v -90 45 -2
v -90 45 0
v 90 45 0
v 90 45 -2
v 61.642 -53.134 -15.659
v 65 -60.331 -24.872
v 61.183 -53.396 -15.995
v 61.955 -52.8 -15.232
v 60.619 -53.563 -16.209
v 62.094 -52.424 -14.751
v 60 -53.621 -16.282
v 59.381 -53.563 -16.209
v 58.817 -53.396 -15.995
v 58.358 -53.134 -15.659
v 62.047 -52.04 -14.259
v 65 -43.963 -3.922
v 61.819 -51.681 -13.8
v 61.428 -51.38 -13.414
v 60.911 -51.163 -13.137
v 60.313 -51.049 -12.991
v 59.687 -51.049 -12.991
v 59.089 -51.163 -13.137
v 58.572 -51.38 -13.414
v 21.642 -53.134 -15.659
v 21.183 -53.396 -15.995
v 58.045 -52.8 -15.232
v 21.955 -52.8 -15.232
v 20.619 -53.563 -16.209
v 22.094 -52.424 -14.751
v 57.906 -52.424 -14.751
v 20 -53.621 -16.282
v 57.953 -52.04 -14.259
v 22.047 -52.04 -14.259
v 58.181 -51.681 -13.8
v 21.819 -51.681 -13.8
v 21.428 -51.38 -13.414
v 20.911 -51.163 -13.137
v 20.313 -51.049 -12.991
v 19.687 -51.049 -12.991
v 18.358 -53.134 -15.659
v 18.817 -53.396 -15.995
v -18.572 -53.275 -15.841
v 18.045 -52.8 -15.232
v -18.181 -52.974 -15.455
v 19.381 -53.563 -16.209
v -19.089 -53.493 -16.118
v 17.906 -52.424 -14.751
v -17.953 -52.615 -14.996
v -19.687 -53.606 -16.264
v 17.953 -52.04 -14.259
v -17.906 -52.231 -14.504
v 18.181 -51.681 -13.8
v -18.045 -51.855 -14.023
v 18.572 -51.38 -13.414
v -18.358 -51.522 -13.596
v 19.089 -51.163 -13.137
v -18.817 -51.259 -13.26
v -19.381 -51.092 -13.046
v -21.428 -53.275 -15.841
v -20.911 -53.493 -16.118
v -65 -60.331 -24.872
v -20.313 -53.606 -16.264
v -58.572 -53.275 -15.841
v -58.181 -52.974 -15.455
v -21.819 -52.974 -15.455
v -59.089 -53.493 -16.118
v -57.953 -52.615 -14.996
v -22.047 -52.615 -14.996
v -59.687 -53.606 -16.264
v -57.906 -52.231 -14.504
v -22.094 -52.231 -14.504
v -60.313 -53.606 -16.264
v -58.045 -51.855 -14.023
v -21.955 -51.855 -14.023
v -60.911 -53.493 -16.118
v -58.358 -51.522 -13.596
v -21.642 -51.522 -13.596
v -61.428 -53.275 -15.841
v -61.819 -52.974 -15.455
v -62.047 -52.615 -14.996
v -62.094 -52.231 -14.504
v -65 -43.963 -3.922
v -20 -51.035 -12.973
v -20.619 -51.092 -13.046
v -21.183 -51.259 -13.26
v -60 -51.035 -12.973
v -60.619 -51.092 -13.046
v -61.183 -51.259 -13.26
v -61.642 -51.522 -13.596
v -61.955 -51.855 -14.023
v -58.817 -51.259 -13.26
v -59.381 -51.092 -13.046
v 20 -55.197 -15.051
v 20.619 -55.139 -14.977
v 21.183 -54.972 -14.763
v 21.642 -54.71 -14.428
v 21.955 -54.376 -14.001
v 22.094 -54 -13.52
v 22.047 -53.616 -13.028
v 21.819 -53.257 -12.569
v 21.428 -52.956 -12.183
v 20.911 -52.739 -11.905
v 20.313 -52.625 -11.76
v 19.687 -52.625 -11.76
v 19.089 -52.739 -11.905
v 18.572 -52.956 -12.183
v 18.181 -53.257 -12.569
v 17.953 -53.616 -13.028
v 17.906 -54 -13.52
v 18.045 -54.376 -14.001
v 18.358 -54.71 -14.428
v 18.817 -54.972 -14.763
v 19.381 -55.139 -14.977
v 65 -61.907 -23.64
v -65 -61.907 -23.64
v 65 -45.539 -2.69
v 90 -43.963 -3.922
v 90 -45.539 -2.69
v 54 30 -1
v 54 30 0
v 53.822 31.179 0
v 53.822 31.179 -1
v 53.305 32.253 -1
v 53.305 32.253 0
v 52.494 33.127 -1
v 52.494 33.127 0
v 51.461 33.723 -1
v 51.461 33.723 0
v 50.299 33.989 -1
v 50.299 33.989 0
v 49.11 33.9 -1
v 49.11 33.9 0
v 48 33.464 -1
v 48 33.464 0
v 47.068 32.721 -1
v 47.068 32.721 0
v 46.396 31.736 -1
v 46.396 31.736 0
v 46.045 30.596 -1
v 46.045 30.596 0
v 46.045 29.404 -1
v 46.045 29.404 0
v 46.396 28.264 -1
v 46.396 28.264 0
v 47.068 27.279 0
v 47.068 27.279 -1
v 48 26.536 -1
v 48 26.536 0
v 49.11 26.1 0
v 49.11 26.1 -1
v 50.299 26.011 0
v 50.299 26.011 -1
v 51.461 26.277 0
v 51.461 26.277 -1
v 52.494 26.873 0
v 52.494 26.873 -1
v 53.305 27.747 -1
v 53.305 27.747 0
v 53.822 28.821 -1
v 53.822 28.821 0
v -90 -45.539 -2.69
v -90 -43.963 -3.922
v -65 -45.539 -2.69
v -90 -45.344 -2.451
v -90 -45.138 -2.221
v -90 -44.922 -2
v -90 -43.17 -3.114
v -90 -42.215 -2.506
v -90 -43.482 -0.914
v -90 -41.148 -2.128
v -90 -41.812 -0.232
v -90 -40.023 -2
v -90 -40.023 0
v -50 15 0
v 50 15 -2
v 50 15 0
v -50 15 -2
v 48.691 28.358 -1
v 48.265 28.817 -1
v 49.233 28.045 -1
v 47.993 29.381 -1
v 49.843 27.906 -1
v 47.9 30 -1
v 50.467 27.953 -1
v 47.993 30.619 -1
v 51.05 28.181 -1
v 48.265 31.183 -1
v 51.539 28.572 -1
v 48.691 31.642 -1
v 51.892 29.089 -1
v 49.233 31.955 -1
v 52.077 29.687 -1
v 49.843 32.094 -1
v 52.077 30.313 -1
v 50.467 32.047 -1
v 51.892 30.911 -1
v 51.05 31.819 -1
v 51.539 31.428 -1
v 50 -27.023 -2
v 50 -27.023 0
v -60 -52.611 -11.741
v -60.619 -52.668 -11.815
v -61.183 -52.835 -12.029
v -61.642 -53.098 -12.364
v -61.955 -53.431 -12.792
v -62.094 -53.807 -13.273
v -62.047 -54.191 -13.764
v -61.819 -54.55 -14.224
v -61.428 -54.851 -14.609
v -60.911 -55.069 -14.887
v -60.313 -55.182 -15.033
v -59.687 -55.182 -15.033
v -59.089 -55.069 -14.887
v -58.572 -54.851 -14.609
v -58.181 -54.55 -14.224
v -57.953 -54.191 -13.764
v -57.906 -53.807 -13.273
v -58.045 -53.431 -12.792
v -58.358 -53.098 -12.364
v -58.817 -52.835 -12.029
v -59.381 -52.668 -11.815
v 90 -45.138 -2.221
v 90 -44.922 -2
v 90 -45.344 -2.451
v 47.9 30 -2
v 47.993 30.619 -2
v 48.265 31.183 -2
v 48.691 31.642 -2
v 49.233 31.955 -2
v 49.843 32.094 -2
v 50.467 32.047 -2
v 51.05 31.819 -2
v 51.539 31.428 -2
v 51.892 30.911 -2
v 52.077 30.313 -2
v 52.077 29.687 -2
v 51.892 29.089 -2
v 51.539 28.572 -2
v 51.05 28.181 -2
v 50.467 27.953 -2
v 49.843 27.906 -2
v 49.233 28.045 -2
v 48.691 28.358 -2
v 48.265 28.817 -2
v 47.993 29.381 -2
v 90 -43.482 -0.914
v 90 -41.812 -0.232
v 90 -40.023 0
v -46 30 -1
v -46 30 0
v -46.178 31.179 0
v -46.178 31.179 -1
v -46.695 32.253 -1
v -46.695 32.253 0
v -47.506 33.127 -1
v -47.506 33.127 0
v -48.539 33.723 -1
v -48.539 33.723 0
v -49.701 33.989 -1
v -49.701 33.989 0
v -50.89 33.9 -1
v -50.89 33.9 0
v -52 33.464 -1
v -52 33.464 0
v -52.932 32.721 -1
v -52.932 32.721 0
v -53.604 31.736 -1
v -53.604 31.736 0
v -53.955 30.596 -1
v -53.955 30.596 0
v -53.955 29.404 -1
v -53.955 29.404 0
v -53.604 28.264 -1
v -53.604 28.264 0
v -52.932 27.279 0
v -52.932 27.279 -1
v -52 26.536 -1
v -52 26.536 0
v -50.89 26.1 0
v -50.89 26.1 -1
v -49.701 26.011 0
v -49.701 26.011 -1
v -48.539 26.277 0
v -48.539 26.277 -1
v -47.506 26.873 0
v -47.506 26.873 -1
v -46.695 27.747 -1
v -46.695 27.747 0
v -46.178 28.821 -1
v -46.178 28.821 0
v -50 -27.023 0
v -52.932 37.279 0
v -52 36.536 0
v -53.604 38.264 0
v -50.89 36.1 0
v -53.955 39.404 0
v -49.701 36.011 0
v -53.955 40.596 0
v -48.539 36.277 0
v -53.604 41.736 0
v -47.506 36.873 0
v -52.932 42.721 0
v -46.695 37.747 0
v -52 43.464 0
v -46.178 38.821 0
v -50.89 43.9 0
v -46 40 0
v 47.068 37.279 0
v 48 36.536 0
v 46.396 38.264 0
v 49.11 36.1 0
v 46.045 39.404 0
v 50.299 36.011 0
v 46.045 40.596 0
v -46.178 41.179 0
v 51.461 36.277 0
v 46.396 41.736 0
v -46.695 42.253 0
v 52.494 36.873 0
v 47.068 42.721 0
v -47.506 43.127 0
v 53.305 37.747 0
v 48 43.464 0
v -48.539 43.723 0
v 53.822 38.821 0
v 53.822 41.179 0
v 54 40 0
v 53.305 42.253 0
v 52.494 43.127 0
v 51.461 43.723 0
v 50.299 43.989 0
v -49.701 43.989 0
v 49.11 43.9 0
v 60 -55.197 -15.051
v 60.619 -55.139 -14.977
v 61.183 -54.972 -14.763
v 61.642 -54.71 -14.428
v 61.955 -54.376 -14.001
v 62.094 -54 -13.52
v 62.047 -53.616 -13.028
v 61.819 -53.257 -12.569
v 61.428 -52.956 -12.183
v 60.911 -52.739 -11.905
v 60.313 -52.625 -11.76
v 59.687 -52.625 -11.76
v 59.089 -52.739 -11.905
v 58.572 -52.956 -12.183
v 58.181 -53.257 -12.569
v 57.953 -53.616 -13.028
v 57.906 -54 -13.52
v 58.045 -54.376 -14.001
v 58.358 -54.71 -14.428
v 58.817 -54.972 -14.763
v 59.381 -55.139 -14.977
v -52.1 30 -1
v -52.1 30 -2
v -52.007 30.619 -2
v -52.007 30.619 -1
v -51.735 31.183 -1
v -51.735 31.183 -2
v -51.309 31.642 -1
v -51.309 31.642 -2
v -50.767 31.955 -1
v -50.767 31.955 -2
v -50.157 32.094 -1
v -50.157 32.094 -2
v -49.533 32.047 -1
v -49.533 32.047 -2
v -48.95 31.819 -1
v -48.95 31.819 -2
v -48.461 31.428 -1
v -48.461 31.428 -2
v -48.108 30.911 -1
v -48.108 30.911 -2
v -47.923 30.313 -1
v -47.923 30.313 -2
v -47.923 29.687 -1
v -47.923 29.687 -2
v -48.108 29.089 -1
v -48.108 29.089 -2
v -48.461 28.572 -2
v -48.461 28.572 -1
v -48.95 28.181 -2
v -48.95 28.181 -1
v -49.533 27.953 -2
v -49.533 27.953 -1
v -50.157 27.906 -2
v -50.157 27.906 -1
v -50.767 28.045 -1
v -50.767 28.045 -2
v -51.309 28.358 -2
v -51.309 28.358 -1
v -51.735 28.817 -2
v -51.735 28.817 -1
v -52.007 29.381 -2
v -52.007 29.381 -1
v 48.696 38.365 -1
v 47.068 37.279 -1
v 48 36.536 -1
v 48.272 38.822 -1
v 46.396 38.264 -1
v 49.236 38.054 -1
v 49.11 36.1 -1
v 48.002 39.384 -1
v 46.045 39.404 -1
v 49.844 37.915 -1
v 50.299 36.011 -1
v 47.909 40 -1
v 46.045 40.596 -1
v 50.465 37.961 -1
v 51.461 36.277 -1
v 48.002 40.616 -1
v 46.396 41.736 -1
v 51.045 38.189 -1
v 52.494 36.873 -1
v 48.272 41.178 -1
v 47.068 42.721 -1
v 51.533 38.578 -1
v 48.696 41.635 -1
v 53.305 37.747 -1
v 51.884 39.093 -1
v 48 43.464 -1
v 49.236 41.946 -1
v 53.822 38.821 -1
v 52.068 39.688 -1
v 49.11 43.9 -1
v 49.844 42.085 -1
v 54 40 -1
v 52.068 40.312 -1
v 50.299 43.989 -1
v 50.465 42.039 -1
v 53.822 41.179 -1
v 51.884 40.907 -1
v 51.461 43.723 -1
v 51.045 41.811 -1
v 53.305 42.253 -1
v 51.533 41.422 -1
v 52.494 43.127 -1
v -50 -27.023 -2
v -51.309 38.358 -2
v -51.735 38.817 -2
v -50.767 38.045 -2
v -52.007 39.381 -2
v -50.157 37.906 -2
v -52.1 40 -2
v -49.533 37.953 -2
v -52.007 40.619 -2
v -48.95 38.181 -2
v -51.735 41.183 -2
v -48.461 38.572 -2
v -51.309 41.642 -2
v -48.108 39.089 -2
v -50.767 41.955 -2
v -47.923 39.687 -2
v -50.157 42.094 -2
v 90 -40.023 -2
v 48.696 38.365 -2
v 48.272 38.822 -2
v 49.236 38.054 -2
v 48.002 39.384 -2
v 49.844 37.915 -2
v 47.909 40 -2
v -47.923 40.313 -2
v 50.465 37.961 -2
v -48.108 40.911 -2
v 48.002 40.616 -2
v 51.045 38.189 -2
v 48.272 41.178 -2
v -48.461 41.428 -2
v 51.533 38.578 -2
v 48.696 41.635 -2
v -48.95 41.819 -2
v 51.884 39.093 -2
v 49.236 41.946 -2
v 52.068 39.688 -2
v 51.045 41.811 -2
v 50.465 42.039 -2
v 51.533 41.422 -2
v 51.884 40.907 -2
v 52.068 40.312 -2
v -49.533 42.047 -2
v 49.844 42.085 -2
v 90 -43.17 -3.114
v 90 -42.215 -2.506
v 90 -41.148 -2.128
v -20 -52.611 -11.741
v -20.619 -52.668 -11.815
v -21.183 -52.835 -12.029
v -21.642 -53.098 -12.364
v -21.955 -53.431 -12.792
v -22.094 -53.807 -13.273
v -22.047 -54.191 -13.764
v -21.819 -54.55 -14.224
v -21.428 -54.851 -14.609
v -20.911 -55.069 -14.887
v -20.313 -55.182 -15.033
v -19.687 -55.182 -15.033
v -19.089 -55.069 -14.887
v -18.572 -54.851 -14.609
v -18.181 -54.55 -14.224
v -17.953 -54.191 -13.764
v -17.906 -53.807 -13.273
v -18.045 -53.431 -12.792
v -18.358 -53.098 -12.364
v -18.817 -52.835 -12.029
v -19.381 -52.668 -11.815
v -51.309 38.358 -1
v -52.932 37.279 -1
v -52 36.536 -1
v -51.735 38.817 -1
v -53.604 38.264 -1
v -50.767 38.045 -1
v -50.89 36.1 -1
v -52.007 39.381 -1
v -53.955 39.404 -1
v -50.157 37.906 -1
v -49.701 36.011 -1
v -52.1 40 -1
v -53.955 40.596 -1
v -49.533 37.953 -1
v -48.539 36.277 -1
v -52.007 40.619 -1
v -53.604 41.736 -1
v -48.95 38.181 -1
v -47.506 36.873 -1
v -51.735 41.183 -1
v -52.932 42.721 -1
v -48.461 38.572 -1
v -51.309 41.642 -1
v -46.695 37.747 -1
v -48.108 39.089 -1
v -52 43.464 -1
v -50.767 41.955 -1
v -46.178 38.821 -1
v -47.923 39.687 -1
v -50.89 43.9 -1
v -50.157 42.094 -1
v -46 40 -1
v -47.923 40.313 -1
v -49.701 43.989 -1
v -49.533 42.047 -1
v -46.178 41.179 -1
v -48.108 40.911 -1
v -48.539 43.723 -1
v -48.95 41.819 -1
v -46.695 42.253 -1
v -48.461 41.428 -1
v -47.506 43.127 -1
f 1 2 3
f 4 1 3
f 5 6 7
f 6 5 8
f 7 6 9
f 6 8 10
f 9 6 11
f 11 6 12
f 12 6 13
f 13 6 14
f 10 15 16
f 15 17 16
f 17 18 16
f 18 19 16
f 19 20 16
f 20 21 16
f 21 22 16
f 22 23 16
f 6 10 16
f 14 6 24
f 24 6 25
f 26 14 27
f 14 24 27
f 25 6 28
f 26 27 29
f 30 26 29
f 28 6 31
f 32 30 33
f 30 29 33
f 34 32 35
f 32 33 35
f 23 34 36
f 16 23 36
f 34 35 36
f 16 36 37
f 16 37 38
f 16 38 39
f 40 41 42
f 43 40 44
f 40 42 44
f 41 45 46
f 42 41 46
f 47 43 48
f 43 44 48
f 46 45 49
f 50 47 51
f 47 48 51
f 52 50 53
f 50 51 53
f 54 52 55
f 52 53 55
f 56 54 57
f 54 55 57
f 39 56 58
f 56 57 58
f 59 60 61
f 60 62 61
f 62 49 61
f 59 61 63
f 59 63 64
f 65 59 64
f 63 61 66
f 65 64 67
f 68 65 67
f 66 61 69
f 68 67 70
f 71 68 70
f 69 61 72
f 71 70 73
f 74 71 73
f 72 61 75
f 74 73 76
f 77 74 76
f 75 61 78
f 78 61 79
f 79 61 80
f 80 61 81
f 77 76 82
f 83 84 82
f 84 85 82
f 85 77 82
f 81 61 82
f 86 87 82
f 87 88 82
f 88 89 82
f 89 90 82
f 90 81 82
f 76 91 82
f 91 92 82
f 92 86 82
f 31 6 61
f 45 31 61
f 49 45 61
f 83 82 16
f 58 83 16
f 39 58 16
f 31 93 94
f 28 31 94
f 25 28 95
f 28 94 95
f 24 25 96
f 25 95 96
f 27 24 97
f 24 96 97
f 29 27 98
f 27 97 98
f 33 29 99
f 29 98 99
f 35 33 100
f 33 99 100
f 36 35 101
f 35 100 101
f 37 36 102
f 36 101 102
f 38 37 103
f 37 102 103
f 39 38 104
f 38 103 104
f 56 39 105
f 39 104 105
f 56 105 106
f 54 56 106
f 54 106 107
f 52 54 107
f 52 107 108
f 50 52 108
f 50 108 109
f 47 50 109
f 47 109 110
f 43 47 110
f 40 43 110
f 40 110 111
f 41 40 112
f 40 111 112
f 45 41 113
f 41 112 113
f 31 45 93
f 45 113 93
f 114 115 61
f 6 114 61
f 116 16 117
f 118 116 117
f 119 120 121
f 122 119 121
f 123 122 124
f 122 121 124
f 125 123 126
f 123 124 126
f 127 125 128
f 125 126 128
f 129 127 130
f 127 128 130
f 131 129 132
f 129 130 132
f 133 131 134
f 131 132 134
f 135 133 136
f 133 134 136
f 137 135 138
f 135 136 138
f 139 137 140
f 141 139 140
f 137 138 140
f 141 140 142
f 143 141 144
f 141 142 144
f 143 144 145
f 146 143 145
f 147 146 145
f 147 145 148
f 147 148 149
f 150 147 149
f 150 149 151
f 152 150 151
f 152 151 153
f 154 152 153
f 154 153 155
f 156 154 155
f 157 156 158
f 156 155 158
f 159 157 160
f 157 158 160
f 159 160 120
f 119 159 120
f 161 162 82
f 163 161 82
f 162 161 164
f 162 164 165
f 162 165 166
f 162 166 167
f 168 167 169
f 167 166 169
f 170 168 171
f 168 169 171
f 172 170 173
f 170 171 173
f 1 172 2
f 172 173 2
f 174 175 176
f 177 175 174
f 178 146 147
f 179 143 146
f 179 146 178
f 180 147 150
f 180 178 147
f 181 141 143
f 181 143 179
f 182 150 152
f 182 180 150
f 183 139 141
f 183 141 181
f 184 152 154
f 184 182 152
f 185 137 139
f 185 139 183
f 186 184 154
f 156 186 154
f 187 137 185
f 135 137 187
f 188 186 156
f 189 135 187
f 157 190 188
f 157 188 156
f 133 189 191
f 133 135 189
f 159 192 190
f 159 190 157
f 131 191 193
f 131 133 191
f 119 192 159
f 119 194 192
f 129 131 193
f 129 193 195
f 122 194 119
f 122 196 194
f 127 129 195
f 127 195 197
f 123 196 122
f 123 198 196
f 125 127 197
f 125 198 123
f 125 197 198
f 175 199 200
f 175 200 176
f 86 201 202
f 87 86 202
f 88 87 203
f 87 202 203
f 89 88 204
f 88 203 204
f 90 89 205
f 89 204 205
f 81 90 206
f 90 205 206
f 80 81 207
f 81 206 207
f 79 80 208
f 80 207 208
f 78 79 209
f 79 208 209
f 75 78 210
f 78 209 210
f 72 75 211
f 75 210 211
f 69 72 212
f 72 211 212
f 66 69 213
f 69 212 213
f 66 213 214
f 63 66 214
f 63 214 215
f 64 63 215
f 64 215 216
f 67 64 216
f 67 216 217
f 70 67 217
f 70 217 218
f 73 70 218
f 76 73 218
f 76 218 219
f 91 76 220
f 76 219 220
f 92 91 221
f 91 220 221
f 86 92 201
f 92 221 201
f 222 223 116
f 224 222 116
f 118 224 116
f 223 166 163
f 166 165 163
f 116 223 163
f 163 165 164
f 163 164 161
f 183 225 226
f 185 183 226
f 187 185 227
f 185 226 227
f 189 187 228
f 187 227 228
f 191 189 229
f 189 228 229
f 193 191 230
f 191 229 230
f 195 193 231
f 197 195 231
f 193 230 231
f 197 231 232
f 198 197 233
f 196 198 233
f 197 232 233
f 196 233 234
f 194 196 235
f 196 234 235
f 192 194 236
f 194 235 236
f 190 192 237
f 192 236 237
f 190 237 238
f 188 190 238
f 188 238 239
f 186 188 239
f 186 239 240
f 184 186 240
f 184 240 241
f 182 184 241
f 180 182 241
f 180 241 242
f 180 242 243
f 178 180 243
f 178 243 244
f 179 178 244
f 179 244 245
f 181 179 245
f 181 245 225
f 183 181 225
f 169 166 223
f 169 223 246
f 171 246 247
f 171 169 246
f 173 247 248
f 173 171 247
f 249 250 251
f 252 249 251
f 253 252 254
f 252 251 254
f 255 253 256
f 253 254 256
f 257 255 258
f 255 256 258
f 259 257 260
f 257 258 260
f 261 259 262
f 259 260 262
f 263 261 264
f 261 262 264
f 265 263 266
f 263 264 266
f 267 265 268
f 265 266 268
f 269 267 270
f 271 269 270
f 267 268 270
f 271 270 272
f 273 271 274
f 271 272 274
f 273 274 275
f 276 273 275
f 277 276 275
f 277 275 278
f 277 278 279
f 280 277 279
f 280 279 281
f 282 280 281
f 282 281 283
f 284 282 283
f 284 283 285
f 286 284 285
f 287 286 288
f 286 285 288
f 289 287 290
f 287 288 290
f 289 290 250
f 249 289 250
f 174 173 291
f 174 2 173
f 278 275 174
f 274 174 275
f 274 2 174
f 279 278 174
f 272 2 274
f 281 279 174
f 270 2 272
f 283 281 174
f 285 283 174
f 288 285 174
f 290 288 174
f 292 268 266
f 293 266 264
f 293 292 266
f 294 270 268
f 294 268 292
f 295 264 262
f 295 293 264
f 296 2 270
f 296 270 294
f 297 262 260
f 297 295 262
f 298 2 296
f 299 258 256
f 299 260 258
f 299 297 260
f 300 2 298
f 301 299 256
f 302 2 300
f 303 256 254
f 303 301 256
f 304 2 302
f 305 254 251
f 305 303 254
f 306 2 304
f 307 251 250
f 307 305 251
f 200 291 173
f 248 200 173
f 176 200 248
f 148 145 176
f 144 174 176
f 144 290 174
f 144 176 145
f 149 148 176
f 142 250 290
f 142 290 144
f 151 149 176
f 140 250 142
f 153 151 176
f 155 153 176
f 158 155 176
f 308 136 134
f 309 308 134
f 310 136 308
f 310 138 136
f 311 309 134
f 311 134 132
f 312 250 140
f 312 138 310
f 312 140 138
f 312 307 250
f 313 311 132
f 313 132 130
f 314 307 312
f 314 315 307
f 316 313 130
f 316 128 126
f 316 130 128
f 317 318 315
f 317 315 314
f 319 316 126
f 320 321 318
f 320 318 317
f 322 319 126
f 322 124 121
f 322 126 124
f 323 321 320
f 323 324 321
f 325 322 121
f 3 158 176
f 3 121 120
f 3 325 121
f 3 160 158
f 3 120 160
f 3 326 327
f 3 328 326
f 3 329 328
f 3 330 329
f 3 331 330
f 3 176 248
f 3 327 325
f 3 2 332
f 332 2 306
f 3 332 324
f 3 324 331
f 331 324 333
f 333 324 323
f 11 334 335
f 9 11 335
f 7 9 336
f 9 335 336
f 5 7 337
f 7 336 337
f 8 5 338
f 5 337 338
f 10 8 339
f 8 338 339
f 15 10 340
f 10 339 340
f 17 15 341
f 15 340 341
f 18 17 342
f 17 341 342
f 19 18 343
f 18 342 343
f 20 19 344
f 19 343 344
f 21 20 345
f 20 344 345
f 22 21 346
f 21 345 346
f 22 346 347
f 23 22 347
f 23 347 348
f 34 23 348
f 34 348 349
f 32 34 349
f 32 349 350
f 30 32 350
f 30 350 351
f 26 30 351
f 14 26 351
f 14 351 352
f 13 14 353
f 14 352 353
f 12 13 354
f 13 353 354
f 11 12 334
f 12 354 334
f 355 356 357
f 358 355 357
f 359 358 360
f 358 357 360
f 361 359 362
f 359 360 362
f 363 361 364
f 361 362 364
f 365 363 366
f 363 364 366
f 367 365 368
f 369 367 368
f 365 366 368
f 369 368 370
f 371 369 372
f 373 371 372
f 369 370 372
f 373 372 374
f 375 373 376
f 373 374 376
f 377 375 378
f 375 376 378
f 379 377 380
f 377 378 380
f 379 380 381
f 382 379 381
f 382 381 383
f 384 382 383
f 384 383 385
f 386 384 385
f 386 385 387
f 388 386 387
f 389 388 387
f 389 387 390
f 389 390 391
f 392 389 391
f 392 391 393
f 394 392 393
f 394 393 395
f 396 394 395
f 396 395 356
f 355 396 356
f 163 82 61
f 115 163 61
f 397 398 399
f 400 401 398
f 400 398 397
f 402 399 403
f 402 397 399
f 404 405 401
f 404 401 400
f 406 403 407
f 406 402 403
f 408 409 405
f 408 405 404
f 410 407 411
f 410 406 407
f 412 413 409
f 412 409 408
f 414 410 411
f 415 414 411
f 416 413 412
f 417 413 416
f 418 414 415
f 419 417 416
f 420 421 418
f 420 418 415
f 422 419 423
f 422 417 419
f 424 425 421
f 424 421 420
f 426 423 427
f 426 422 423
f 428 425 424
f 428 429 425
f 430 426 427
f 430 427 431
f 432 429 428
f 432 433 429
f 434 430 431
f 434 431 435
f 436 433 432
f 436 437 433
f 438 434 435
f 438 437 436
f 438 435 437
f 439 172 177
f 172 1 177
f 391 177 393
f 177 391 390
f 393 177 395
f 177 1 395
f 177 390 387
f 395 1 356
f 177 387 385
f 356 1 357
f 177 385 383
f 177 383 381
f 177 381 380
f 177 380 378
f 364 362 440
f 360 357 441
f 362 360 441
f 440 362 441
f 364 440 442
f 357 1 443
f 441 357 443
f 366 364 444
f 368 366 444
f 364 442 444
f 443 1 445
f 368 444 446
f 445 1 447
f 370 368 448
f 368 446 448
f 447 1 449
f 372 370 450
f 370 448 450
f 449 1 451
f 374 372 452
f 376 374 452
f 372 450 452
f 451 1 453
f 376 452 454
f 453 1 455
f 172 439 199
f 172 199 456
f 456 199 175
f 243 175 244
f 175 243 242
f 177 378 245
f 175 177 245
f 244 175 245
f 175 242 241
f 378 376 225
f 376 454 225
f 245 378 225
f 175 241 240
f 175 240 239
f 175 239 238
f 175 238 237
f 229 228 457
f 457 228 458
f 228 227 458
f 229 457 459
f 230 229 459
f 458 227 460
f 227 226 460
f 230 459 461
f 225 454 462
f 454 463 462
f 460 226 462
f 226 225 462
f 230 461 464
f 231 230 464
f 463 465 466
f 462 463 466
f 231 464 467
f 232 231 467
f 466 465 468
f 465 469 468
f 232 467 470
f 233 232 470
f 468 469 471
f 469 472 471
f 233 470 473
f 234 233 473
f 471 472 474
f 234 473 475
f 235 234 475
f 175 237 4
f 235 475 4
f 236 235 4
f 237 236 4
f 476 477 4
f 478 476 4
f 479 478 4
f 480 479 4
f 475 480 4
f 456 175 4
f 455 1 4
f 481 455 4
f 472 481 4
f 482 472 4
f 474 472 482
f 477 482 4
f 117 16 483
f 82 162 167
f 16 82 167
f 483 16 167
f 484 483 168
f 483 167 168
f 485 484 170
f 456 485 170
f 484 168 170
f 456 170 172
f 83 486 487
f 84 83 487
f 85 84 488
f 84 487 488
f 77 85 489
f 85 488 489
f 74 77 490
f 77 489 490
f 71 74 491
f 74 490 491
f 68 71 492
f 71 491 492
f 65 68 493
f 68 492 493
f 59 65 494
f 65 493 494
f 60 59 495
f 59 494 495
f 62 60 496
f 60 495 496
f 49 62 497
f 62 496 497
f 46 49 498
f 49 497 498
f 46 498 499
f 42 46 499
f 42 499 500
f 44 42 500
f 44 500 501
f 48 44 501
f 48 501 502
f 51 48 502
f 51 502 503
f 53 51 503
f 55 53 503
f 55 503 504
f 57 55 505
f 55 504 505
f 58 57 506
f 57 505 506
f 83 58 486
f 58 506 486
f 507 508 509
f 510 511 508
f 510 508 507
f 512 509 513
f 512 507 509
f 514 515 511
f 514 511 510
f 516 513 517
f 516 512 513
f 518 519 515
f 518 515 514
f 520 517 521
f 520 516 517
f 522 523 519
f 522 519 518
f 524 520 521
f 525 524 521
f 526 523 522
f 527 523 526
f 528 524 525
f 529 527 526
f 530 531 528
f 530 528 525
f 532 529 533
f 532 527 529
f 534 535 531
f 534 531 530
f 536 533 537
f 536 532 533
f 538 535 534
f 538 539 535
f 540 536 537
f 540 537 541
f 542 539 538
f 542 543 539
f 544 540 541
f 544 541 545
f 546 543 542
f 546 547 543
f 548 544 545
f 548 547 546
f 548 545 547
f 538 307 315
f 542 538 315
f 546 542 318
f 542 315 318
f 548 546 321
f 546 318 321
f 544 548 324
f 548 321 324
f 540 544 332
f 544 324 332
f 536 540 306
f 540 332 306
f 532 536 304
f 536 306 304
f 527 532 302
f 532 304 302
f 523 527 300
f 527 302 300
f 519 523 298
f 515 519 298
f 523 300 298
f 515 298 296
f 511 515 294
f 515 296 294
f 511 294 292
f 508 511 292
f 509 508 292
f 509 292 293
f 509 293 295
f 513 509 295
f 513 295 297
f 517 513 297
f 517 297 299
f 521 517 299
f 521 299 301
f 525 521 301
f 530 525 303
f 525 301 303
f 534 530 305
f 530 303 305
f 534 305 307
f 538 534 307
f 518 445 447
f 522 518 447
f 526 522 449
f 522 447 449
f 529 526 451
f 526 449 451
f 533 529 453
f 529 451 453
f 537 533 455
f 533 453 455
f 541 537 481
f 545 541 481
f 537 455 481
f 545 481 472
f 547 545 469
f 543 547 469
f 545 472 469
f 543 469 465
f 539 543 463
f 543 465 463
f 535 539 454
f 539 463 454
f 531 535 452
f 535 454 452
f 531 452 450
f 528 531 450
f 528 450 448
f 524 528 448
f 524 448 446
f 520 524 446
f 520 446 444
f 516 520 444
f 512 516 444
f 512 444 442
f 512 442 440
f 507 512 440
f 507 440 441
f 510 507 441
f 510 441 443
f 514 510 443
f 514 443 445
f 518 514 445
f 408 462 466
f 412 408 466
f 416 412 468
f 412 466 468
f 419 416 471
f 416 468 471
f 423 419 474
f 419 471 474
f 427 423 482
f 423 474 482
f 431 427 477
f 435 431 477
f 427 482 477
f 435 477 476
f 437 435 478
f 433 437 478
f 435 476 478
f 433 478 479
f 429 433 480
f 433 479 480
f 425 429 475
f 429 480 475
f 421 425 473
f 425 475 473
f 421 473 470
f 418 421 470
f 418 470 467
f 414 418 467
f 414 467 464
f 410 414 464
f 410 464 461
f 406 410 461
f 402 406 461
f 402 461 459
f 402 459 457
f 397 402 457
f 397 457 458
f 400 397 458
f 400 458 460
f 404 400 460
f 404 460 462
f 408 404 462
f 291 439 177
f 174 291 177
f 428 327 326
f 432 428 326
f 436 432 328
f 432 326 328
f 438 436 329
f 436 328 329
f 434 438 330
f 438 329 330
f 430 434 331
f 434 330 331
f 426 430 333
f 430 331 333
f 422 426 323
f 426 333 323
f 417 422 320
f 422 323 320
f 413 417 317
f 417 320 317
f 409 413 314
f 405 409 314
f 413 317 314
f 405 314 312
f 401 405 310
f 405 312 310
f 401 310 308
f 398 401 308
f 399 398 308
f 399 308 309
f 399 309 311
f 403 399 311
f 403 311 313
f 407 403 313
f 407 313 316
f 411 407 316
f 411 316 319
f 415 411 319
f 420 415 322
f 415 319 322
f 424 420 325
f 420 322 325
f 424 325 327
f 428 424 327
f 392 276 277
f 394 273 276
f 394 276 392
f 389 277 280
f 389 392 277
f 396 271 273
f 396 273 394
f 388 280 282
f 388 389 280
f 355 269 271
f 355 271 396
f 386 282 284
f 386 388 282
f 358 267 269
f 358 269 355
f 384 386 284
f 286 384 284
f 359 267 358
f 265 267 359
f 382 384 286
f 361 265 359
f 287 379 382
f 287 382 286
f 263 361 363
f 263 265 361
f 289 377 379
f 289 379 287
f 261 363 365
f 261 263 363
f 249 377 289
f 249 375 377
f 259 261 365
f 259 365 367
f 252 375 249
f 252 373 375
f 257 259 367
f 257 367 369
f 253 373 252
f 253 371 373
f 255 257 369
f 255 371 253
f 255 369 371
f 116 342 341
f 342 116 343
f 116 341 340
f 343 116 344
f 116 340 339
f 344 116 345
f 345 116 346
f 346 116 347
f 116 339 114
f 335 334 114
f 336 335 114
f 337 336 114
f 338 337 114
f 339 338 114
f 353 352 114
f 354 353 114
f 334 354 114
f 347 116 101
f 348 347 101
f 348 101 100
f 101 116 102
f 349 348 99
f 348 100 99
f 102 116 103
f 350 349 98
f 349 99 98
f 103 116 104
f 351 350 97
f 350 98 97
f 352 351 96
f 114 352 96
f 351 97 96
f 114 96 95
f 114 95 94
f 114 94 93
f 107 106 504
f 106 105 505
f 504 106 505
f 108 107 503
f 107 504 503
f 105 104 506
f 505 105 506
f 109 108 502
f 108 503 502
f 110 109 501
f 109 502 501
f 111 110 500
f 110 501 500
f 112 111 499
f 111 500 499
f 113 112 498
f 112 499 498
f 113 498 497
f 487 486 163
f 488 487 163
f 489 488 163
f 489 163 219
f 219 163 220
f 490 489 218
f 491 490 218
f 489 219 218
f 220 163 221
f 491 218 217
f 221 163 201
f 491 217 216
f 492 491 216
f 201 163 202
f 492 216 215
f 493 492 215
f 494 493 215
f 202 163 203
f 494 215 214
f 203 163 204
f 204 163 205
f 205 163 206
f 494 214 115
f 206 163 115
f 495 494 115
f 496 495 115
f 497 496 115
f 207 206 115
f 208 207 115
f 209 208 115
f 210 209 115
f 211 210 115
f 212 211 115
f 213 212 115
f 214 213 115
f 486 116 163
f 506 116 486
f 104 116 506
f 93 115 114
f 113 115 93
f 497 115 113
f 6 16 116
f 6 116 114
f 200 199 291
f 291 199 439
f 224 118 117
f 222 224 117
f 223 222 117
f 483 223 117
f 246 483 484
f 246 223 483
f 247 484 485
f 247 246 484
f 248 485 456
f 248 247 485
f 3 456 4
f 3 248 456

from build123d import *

# Parameters (mm, degrees)
SKETCH_2_W               = 180
SKETCH_2_H               = 90
SM_BASE_FLANGE_1_DEPTH   = 2
SM_START                 = -90
SM_EDGE_FLANGE_1_DEPTH   = 180
SM_EDGE_FLANGE_1_2_DEPTH = 180
SKETCH_10_W              = 100
SKETCH_10_H              = 42.023300627
CUT_EXTRUDE_1_DEPTH      = 10
SKETCH_11_R              = 2.1
CUT_EXTRUDE_2_DEPTH      = 2
SKETCH_12_W              = 25
SKETCH_12_H              = 26.58587188
CUT_EXTRUDE_3_DEPTH      = 10
SKETCH_13_R              = 2.1
SKETCH_13_R_2            = 2.090991101
CUT_EXTRUDE_4_DEPTH      = 10
SKETCH_14_R              = 4
CUT_EXTRUDE_5_DEPTH      = 1


# Read off the part's stored shape, not the designer's step: 边线-法兰1
# Sheet-metal steps are written as plain solids
with BuildPart() as part:
    # Sketch 2 → 基体-法兰1 (new body)
    with BuildSketch(Plane.XY):
        Rectangle(SKETCH_2_W, SKETCH_2_H)
    extrude(amount=-SM_BASE_FLANGE_1_DEPTH)

    # 边线-法兰1 outline → 边线-法兰1 (cut)
    with BuildSketch(Plane.YZ.offset(SM_START)):
        with BuildLine():
            Line((-45, -2), (-44.922280112, -2))
            ThreePointArc((-44.922280112, -2), (-42.669051938, -0.519259301), (-40.023300627, 0))
            Line((-40.023300627, 0), (-45, 0))
            Line((-45, 0), (-45, -2))
        make_face()
    extrude(amount=SM_EDGE_FLANGE_1_DEPTH, mode=Mode.SUBTRACT)

    # Sm Edge Flange 1 2 outline → Sm Edge Flange 1 2 (add)
    with BuildSketch(Plane.YZ.offset(SM_START)):
        with BuildLine():
            ThreePointArc((-44.922280112, -2), (-45.242255885, -2.334969881), (-45.539375902, -2.690369673))
            Line((-45.539375902, -2.690369673), (-61.907273007, -23.640322608))
            Line((-61.907273007, -23.640322608), (-60.3312515, -24.871645559))
            Line((-60.3312515, -24.871645559), (-43.963354395, -3.921692623))
            ThreePointArc((-43.963354395, -3.921692623), (-42.215156361, -2.506029769), (-40.023300627, -2))
            Line((-40.023300627, -2), (-44.922280112, -2))
        make_face()
    extrude(amount=SM_EDGE_FLANGE_1_2_DEPTH)

    # 草图10 → 切除-拉伸1 (cut)
    with BuildSketch(Plane(origin=(0, 0, -2), x_dir=(-1, 0, 0), z_dir=(0, 0, -1))):
        with Locations((0, -6.011650313)):
            Rectangle(SKETCH_10_W, SKETCH_10_H)
    extrude(amount=-CUT_EXTRUDE_1_DEPTH, mode=Mode.SUBTRACT)

    # 草图11 → 切除-拉伸2 (cut)
    with BuildSketch(Plane(origin=(0, -26.972946925, 21.073575737), x_dir=(1, 0, 0), z_dir=(0, -0.788010753606719, 0.6156614753256621))):
        with Locations(Location((60, -43.742751467, 0), (0, 0, 270))):
            Circle(SKETCH_11_R)
        with Locations(Location((20, -43.742751467, 0), (0, 0, 270))):
            Circle(SKETCH_11_R)
        with Locations(Location((-20, -43.742751467, 0), (0, 0, 90))):
            Circle(SKETCH_11_R)
        with Locations(Location((-60, -43.742751467, 0), (0, 0, 90))):
            Circle(SKETCH_11_R)
    extrude(amount=-CUT_EXTRUDE_2_DEPTH, mode=Mode.SUBTRACT)

    # 草图12 → 切除-拉伸3 (cut)
    with BuildSketch(Plane(origin=(0, -25.396925418, 19.842252786), x_dir=(1, 0, 0), z_dir=(0, 0.788010753606719, -0.6156614753256621))):
        with Locations((-77.5, 43.449815527)):
            Rectangle(SKETCH_12_W, SKETCH_12_H)
        with Locations((77.5, 43.449815527)):
            Rectangle(SKETCH_12_W, SKETCH_12_H)
    extrude(amount=-CUT_EXTRUDE_3_DEPTH, mode=Mode.SUBTRACT)

    # 草图13 → 切除-拉伸4 (cut)
    with BuildSketch(Plane(origin=(0, 0, -2), x_dir=(-1, 0, 0), z_dir=(0, 0, -1))):
        with Locations((50, 30)):
            Circle(SKETCH_13_R)
        with Locations((50, 40)):
            Circle(SKETCH_13_R)
        with Locations((-50, 30)):
            Circle(SKETCH_13_R)
        with Locations((-50, 40)):
            Circle(SKETCH_13_R_2)
    extrude(amount=-CUT_EXTRUDE_4_DEPTH, mode=Mode.SUBTRACT)

    # 草图14 → 切除-拉伸5 (cut)
    with BuildSketch(Plane.XY):
        with Locations((-50, 40)):
            Circle(SKETCH_14_R)
        with Locations((-50, 30)):
            Circle(SKETCH_14_R)
        with Locations((50, 40)):
            Circle(SKETCH_14_R)
        with Locations((50, 30)):
            Circle(SKETCH_14_R)
    extrude(amount=-CUT_EXTRUDE_5_DEPTH, mode=Mode.SUBTRACT)


solid = part.part
